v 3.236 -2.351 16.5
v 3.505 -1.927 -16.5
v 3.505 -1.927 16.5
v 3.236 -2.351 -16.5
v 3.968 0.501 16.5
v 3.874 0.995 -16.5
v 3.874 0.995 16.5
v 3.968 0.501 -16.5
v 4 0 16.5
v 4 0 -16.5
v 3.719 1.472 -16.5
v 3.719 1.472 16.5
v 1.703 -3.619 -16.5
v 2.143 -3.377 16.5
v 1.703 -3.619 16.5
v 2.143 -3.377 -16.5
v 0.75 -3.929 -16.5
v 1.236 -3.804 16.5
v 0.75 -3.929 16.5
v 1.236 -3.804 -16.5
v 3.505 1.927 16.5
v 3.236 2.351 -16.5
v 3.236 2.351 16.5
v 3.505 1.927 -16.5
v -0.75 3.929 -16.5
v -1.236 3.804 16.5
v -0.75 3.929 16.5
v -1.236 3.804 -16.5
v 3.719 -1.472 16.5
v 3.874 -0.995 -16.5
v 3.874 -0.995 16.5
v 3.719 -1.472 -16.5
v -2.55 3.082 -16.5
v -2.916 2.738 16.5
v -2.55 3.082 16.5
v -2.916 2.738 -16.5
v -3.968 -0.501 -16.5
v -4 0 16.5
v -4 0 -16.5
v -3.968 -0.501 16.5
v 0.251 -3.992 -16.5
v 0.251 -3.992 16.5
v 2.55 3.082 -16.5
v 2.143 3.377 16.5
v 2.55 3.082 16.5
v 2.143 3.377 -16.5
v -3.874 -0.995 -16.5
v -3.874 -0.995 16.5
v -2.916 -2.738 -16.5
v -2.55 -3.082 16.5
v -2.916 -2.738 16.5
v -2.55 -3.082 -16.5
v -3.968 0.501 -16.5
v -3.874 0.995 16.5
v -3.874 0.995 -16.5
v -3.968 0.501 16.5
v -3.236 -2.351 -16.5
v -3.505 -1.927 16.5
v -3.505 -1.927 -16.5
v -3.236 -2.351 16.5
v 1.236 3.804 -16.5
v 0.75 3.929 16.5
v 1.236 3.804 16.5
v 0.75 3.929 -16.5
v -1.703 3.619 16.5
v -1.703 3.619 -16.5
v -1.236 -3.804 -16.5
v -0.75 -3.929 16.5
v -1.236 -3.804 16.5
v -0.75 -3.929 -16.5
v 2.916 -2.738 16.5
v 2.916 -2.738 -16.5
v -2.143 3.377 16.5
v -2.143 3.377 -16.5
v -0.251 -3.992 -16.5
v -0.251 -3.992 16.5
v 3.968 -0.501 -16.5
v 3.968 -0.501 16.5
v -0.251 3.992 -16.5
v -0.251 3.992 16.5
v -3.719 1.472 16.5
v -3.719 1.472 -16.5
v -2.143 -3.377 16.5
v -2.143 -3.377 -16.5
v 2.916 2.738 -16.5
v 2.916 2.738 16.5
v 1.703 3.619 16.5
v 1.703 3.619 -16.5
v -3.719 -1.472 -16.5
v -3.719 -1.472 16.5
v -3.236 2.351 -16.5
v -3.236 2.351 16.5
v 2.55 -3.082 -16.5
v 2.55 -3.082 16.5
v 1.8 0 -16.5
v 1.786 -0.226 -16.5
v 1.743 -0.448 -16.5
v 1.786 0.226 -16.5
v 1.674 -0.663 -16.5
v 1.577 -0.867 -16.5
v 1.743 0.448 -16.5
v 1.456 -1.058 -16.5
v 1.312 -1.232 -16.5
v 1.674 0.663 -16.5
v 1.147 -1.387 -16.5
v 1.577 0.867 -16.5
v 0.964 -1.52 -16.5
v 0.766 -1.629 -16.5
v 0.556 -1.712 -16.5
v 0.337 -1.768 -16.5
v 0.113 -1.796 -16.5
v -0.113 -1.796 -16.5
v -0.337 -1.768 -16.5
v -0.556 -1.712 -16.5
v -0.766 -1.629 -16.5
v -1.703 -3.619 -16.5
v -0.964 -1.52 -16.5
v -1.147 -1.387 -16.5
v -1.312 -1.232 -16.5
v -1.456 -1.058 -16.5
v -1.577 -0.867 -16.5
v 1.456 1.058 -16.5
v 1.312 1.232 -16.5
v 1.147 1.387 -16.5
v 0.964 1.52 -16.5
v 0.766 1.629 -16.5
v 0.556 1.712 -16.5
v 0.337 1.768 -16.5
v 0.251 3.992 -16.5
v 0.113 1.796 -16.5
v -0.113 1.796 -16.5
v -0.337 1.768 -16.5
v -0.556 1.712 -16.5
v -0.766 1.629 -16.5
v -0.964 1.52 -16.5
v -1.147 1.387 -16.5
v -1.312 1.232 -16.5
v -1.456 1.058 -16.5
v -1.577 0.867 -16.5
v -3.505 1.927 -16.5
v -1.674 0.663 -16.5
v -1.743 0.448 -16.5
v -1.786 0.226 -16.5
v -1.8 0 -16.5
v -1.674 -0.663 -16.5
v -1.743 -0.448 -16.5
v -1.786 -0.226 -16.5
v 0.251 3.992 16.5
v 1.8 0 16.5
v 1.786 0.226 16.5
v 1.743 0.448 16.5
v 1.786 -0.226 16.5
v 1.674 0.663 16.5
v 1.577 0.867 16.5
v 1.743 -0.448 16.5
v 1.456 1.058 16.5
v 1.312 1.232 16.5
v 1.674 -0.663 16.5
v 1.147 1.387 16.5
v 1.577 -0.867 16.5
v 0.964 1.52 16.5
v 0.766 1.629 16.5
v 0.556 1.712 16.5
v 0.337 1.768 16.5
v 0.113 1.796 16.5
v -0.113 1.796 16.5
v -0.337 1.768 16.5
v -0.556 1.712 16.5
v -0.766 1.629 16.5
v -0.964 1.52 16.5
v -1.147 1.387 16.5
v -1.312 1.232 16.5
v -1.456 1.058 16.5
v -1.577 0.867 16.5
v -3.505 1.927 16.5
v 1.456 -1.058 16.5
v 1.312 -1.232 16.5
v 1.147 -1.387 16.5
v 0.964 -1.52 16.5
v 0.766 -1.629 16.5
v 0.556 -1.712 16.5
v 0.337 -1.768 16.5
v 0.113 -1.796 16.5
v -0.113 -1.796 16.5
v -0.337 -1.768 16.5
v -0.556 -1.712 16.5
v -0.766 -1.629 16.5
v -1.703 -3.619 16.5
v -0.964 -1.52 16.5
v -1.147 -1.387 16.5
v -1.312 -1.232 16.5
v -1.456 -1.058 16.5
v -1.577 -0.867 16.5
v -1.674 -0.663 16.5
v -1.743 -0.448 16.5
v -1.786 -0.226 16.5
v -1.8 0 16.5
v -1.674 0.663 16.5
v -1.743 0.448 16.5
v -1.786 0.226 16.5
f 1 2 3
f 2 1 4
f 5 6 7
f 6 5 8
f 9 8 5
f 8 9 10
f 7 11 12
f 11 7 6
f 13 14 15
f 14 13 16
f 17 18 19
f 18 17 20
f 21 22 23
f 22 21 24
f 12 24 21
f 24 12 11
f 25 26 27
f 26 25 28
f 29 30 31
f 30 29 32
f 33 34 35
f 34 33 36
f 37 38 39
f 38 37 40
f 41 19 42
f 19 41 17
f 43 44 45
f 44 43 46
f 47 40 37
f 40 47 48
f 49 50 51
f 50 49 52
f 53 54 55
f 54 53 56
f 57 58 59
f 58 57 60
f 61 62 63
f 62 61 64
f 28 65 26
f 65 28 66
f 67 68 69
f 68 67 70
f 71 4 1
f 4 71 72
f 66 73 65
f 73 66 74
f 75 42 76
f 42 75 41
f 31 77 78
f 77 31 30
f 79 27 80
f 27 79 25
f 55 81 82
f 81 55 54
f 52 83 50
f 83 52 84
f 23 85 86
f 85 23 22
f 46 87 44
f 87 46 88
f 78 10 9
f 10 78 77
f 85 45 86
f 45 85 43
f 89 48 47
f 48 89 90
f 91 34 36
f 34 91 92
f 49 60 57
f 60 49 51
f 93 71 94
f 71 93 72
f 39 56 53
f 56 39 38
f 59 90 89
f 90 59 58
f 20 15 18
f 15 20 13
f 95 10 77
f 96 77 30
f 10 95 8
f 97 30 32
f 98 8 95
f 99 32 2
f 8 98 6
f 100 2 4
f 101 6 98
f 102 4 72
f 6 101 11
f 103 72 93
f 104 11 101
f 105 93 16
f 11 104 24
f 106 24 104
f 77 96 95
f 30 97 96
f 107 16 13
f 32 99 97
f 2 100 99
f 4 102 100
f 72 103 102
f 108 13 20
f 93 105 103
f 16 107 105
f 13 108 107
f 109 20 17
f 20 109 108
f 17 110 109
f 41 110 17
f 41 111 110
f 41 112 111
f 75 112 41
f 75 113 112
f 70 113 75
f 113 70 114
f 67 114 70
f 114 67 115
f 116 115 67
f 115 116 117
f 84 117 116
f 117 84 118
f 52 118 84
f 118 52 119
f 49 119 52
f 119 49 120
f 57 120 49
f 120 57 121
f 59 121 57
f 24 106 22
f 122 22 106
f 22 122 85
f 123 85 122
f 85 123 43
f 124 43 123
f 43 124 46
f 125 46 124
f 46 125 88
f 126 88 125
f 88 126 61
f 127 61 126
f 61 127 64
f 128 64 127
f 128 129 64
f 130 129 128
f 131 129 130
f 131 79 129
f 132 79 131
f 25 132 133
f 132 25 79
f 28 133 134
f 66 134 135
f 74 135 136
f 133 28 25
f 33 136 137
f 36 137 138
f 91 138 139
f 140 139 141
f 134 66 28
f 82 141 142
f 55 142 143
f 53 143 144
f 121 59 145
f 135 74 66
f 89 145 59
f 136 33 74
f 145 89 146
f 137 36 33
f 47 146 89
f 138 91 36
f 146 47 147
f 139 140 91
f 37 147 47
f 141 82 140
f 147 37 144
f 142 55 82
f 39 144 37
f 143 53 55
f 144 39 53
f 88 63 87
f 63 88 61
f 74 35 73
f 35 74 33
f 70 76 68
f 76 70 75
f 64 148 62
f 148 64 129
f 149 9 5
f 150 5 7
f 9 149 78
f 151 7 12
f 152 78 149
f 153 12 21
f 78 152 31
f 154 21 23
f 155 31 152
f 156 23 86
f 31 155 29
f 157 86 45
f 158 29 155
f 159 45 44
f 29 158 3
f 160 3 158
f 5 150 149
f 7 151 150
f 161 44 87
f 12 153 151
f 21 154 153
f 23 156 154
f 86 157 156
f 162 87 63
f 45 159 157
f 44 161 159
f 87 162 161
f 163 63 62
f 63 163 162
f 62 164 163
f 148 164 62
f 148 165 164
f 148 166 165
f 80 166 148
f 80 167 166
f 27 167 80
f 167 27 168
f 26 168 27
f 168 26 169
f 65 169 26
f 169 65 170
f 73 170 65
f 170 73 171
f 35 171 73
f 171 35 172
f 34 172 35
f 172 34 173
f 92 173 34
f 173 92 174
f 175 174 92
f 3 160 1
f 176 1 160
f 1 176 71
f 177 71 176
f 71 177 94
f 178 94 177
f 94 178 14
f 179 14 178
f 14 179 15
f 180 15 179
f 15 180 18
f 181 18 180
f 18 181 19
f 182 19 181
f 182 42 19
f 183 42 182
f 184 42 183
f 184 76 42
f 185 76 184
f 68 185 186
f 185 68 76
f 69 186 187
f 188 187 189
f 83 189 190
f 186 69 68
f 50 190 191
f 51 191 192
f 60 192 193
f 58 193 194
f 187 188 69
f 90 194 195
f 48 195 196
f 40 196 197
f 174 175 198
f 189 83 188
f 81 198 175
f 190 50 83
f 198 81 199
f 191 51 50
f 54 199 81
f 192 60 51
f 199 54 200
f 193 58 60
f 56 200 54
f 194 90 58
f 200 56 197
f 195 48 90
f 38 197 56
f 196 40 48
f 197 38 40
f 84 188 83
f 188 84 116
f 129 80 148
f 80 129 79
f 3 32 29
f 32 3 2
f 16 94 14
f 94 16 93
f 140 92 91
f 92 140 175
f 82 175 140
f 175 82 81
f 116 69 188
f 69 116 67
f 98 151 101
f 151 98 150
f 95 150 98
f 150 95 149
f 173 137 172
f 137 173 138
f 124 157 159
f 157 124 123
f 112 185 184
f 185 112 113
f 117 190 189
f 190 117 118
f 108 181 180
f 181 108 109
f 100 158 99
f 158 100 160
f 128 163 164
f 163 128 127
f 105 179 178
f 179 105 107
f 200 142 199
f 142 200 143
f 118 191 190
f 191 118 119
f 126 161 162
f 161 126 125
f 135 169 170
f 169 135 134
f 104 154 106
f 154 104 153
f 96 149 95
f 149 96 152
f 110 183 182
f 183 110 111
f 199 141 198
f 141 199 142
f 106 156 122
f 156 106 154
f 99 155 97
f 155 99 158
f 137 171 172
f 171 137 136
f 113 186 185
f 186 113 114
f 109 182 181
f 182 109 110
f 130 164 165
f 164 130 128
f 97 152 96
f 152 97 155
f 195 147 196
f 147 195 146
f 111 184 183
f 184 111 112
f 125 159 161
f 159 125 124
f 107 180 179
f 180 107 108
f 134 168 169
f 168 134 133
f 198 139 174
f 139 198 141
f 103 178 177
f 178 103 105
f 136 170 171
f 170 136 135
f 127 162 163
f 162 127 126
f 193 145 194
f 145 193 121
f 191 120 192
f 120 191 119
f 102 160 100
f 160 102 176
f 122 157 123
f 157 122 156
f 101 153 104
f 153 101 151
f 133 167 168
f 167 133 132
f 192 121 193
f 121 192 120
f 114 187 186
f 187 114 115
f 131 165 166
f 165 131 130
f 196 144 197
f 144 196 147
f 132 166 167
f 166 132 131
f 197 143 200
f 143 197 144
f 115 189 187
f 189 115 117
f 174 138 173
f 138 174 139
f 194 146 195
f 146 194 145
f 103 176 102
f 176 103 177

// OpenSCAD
$fn = 50;


difference() {
	union() {
		translate(v = [0, 0, -16.5000000000]) {
			cylinder(h = 33, r = 4.0000000000);
		}
	}
	union() {
		#translate(v = [0, 0, -100.0000000000]) {
			cylinder(h = 200, r = 1.8000000000);
		}
	}
}
